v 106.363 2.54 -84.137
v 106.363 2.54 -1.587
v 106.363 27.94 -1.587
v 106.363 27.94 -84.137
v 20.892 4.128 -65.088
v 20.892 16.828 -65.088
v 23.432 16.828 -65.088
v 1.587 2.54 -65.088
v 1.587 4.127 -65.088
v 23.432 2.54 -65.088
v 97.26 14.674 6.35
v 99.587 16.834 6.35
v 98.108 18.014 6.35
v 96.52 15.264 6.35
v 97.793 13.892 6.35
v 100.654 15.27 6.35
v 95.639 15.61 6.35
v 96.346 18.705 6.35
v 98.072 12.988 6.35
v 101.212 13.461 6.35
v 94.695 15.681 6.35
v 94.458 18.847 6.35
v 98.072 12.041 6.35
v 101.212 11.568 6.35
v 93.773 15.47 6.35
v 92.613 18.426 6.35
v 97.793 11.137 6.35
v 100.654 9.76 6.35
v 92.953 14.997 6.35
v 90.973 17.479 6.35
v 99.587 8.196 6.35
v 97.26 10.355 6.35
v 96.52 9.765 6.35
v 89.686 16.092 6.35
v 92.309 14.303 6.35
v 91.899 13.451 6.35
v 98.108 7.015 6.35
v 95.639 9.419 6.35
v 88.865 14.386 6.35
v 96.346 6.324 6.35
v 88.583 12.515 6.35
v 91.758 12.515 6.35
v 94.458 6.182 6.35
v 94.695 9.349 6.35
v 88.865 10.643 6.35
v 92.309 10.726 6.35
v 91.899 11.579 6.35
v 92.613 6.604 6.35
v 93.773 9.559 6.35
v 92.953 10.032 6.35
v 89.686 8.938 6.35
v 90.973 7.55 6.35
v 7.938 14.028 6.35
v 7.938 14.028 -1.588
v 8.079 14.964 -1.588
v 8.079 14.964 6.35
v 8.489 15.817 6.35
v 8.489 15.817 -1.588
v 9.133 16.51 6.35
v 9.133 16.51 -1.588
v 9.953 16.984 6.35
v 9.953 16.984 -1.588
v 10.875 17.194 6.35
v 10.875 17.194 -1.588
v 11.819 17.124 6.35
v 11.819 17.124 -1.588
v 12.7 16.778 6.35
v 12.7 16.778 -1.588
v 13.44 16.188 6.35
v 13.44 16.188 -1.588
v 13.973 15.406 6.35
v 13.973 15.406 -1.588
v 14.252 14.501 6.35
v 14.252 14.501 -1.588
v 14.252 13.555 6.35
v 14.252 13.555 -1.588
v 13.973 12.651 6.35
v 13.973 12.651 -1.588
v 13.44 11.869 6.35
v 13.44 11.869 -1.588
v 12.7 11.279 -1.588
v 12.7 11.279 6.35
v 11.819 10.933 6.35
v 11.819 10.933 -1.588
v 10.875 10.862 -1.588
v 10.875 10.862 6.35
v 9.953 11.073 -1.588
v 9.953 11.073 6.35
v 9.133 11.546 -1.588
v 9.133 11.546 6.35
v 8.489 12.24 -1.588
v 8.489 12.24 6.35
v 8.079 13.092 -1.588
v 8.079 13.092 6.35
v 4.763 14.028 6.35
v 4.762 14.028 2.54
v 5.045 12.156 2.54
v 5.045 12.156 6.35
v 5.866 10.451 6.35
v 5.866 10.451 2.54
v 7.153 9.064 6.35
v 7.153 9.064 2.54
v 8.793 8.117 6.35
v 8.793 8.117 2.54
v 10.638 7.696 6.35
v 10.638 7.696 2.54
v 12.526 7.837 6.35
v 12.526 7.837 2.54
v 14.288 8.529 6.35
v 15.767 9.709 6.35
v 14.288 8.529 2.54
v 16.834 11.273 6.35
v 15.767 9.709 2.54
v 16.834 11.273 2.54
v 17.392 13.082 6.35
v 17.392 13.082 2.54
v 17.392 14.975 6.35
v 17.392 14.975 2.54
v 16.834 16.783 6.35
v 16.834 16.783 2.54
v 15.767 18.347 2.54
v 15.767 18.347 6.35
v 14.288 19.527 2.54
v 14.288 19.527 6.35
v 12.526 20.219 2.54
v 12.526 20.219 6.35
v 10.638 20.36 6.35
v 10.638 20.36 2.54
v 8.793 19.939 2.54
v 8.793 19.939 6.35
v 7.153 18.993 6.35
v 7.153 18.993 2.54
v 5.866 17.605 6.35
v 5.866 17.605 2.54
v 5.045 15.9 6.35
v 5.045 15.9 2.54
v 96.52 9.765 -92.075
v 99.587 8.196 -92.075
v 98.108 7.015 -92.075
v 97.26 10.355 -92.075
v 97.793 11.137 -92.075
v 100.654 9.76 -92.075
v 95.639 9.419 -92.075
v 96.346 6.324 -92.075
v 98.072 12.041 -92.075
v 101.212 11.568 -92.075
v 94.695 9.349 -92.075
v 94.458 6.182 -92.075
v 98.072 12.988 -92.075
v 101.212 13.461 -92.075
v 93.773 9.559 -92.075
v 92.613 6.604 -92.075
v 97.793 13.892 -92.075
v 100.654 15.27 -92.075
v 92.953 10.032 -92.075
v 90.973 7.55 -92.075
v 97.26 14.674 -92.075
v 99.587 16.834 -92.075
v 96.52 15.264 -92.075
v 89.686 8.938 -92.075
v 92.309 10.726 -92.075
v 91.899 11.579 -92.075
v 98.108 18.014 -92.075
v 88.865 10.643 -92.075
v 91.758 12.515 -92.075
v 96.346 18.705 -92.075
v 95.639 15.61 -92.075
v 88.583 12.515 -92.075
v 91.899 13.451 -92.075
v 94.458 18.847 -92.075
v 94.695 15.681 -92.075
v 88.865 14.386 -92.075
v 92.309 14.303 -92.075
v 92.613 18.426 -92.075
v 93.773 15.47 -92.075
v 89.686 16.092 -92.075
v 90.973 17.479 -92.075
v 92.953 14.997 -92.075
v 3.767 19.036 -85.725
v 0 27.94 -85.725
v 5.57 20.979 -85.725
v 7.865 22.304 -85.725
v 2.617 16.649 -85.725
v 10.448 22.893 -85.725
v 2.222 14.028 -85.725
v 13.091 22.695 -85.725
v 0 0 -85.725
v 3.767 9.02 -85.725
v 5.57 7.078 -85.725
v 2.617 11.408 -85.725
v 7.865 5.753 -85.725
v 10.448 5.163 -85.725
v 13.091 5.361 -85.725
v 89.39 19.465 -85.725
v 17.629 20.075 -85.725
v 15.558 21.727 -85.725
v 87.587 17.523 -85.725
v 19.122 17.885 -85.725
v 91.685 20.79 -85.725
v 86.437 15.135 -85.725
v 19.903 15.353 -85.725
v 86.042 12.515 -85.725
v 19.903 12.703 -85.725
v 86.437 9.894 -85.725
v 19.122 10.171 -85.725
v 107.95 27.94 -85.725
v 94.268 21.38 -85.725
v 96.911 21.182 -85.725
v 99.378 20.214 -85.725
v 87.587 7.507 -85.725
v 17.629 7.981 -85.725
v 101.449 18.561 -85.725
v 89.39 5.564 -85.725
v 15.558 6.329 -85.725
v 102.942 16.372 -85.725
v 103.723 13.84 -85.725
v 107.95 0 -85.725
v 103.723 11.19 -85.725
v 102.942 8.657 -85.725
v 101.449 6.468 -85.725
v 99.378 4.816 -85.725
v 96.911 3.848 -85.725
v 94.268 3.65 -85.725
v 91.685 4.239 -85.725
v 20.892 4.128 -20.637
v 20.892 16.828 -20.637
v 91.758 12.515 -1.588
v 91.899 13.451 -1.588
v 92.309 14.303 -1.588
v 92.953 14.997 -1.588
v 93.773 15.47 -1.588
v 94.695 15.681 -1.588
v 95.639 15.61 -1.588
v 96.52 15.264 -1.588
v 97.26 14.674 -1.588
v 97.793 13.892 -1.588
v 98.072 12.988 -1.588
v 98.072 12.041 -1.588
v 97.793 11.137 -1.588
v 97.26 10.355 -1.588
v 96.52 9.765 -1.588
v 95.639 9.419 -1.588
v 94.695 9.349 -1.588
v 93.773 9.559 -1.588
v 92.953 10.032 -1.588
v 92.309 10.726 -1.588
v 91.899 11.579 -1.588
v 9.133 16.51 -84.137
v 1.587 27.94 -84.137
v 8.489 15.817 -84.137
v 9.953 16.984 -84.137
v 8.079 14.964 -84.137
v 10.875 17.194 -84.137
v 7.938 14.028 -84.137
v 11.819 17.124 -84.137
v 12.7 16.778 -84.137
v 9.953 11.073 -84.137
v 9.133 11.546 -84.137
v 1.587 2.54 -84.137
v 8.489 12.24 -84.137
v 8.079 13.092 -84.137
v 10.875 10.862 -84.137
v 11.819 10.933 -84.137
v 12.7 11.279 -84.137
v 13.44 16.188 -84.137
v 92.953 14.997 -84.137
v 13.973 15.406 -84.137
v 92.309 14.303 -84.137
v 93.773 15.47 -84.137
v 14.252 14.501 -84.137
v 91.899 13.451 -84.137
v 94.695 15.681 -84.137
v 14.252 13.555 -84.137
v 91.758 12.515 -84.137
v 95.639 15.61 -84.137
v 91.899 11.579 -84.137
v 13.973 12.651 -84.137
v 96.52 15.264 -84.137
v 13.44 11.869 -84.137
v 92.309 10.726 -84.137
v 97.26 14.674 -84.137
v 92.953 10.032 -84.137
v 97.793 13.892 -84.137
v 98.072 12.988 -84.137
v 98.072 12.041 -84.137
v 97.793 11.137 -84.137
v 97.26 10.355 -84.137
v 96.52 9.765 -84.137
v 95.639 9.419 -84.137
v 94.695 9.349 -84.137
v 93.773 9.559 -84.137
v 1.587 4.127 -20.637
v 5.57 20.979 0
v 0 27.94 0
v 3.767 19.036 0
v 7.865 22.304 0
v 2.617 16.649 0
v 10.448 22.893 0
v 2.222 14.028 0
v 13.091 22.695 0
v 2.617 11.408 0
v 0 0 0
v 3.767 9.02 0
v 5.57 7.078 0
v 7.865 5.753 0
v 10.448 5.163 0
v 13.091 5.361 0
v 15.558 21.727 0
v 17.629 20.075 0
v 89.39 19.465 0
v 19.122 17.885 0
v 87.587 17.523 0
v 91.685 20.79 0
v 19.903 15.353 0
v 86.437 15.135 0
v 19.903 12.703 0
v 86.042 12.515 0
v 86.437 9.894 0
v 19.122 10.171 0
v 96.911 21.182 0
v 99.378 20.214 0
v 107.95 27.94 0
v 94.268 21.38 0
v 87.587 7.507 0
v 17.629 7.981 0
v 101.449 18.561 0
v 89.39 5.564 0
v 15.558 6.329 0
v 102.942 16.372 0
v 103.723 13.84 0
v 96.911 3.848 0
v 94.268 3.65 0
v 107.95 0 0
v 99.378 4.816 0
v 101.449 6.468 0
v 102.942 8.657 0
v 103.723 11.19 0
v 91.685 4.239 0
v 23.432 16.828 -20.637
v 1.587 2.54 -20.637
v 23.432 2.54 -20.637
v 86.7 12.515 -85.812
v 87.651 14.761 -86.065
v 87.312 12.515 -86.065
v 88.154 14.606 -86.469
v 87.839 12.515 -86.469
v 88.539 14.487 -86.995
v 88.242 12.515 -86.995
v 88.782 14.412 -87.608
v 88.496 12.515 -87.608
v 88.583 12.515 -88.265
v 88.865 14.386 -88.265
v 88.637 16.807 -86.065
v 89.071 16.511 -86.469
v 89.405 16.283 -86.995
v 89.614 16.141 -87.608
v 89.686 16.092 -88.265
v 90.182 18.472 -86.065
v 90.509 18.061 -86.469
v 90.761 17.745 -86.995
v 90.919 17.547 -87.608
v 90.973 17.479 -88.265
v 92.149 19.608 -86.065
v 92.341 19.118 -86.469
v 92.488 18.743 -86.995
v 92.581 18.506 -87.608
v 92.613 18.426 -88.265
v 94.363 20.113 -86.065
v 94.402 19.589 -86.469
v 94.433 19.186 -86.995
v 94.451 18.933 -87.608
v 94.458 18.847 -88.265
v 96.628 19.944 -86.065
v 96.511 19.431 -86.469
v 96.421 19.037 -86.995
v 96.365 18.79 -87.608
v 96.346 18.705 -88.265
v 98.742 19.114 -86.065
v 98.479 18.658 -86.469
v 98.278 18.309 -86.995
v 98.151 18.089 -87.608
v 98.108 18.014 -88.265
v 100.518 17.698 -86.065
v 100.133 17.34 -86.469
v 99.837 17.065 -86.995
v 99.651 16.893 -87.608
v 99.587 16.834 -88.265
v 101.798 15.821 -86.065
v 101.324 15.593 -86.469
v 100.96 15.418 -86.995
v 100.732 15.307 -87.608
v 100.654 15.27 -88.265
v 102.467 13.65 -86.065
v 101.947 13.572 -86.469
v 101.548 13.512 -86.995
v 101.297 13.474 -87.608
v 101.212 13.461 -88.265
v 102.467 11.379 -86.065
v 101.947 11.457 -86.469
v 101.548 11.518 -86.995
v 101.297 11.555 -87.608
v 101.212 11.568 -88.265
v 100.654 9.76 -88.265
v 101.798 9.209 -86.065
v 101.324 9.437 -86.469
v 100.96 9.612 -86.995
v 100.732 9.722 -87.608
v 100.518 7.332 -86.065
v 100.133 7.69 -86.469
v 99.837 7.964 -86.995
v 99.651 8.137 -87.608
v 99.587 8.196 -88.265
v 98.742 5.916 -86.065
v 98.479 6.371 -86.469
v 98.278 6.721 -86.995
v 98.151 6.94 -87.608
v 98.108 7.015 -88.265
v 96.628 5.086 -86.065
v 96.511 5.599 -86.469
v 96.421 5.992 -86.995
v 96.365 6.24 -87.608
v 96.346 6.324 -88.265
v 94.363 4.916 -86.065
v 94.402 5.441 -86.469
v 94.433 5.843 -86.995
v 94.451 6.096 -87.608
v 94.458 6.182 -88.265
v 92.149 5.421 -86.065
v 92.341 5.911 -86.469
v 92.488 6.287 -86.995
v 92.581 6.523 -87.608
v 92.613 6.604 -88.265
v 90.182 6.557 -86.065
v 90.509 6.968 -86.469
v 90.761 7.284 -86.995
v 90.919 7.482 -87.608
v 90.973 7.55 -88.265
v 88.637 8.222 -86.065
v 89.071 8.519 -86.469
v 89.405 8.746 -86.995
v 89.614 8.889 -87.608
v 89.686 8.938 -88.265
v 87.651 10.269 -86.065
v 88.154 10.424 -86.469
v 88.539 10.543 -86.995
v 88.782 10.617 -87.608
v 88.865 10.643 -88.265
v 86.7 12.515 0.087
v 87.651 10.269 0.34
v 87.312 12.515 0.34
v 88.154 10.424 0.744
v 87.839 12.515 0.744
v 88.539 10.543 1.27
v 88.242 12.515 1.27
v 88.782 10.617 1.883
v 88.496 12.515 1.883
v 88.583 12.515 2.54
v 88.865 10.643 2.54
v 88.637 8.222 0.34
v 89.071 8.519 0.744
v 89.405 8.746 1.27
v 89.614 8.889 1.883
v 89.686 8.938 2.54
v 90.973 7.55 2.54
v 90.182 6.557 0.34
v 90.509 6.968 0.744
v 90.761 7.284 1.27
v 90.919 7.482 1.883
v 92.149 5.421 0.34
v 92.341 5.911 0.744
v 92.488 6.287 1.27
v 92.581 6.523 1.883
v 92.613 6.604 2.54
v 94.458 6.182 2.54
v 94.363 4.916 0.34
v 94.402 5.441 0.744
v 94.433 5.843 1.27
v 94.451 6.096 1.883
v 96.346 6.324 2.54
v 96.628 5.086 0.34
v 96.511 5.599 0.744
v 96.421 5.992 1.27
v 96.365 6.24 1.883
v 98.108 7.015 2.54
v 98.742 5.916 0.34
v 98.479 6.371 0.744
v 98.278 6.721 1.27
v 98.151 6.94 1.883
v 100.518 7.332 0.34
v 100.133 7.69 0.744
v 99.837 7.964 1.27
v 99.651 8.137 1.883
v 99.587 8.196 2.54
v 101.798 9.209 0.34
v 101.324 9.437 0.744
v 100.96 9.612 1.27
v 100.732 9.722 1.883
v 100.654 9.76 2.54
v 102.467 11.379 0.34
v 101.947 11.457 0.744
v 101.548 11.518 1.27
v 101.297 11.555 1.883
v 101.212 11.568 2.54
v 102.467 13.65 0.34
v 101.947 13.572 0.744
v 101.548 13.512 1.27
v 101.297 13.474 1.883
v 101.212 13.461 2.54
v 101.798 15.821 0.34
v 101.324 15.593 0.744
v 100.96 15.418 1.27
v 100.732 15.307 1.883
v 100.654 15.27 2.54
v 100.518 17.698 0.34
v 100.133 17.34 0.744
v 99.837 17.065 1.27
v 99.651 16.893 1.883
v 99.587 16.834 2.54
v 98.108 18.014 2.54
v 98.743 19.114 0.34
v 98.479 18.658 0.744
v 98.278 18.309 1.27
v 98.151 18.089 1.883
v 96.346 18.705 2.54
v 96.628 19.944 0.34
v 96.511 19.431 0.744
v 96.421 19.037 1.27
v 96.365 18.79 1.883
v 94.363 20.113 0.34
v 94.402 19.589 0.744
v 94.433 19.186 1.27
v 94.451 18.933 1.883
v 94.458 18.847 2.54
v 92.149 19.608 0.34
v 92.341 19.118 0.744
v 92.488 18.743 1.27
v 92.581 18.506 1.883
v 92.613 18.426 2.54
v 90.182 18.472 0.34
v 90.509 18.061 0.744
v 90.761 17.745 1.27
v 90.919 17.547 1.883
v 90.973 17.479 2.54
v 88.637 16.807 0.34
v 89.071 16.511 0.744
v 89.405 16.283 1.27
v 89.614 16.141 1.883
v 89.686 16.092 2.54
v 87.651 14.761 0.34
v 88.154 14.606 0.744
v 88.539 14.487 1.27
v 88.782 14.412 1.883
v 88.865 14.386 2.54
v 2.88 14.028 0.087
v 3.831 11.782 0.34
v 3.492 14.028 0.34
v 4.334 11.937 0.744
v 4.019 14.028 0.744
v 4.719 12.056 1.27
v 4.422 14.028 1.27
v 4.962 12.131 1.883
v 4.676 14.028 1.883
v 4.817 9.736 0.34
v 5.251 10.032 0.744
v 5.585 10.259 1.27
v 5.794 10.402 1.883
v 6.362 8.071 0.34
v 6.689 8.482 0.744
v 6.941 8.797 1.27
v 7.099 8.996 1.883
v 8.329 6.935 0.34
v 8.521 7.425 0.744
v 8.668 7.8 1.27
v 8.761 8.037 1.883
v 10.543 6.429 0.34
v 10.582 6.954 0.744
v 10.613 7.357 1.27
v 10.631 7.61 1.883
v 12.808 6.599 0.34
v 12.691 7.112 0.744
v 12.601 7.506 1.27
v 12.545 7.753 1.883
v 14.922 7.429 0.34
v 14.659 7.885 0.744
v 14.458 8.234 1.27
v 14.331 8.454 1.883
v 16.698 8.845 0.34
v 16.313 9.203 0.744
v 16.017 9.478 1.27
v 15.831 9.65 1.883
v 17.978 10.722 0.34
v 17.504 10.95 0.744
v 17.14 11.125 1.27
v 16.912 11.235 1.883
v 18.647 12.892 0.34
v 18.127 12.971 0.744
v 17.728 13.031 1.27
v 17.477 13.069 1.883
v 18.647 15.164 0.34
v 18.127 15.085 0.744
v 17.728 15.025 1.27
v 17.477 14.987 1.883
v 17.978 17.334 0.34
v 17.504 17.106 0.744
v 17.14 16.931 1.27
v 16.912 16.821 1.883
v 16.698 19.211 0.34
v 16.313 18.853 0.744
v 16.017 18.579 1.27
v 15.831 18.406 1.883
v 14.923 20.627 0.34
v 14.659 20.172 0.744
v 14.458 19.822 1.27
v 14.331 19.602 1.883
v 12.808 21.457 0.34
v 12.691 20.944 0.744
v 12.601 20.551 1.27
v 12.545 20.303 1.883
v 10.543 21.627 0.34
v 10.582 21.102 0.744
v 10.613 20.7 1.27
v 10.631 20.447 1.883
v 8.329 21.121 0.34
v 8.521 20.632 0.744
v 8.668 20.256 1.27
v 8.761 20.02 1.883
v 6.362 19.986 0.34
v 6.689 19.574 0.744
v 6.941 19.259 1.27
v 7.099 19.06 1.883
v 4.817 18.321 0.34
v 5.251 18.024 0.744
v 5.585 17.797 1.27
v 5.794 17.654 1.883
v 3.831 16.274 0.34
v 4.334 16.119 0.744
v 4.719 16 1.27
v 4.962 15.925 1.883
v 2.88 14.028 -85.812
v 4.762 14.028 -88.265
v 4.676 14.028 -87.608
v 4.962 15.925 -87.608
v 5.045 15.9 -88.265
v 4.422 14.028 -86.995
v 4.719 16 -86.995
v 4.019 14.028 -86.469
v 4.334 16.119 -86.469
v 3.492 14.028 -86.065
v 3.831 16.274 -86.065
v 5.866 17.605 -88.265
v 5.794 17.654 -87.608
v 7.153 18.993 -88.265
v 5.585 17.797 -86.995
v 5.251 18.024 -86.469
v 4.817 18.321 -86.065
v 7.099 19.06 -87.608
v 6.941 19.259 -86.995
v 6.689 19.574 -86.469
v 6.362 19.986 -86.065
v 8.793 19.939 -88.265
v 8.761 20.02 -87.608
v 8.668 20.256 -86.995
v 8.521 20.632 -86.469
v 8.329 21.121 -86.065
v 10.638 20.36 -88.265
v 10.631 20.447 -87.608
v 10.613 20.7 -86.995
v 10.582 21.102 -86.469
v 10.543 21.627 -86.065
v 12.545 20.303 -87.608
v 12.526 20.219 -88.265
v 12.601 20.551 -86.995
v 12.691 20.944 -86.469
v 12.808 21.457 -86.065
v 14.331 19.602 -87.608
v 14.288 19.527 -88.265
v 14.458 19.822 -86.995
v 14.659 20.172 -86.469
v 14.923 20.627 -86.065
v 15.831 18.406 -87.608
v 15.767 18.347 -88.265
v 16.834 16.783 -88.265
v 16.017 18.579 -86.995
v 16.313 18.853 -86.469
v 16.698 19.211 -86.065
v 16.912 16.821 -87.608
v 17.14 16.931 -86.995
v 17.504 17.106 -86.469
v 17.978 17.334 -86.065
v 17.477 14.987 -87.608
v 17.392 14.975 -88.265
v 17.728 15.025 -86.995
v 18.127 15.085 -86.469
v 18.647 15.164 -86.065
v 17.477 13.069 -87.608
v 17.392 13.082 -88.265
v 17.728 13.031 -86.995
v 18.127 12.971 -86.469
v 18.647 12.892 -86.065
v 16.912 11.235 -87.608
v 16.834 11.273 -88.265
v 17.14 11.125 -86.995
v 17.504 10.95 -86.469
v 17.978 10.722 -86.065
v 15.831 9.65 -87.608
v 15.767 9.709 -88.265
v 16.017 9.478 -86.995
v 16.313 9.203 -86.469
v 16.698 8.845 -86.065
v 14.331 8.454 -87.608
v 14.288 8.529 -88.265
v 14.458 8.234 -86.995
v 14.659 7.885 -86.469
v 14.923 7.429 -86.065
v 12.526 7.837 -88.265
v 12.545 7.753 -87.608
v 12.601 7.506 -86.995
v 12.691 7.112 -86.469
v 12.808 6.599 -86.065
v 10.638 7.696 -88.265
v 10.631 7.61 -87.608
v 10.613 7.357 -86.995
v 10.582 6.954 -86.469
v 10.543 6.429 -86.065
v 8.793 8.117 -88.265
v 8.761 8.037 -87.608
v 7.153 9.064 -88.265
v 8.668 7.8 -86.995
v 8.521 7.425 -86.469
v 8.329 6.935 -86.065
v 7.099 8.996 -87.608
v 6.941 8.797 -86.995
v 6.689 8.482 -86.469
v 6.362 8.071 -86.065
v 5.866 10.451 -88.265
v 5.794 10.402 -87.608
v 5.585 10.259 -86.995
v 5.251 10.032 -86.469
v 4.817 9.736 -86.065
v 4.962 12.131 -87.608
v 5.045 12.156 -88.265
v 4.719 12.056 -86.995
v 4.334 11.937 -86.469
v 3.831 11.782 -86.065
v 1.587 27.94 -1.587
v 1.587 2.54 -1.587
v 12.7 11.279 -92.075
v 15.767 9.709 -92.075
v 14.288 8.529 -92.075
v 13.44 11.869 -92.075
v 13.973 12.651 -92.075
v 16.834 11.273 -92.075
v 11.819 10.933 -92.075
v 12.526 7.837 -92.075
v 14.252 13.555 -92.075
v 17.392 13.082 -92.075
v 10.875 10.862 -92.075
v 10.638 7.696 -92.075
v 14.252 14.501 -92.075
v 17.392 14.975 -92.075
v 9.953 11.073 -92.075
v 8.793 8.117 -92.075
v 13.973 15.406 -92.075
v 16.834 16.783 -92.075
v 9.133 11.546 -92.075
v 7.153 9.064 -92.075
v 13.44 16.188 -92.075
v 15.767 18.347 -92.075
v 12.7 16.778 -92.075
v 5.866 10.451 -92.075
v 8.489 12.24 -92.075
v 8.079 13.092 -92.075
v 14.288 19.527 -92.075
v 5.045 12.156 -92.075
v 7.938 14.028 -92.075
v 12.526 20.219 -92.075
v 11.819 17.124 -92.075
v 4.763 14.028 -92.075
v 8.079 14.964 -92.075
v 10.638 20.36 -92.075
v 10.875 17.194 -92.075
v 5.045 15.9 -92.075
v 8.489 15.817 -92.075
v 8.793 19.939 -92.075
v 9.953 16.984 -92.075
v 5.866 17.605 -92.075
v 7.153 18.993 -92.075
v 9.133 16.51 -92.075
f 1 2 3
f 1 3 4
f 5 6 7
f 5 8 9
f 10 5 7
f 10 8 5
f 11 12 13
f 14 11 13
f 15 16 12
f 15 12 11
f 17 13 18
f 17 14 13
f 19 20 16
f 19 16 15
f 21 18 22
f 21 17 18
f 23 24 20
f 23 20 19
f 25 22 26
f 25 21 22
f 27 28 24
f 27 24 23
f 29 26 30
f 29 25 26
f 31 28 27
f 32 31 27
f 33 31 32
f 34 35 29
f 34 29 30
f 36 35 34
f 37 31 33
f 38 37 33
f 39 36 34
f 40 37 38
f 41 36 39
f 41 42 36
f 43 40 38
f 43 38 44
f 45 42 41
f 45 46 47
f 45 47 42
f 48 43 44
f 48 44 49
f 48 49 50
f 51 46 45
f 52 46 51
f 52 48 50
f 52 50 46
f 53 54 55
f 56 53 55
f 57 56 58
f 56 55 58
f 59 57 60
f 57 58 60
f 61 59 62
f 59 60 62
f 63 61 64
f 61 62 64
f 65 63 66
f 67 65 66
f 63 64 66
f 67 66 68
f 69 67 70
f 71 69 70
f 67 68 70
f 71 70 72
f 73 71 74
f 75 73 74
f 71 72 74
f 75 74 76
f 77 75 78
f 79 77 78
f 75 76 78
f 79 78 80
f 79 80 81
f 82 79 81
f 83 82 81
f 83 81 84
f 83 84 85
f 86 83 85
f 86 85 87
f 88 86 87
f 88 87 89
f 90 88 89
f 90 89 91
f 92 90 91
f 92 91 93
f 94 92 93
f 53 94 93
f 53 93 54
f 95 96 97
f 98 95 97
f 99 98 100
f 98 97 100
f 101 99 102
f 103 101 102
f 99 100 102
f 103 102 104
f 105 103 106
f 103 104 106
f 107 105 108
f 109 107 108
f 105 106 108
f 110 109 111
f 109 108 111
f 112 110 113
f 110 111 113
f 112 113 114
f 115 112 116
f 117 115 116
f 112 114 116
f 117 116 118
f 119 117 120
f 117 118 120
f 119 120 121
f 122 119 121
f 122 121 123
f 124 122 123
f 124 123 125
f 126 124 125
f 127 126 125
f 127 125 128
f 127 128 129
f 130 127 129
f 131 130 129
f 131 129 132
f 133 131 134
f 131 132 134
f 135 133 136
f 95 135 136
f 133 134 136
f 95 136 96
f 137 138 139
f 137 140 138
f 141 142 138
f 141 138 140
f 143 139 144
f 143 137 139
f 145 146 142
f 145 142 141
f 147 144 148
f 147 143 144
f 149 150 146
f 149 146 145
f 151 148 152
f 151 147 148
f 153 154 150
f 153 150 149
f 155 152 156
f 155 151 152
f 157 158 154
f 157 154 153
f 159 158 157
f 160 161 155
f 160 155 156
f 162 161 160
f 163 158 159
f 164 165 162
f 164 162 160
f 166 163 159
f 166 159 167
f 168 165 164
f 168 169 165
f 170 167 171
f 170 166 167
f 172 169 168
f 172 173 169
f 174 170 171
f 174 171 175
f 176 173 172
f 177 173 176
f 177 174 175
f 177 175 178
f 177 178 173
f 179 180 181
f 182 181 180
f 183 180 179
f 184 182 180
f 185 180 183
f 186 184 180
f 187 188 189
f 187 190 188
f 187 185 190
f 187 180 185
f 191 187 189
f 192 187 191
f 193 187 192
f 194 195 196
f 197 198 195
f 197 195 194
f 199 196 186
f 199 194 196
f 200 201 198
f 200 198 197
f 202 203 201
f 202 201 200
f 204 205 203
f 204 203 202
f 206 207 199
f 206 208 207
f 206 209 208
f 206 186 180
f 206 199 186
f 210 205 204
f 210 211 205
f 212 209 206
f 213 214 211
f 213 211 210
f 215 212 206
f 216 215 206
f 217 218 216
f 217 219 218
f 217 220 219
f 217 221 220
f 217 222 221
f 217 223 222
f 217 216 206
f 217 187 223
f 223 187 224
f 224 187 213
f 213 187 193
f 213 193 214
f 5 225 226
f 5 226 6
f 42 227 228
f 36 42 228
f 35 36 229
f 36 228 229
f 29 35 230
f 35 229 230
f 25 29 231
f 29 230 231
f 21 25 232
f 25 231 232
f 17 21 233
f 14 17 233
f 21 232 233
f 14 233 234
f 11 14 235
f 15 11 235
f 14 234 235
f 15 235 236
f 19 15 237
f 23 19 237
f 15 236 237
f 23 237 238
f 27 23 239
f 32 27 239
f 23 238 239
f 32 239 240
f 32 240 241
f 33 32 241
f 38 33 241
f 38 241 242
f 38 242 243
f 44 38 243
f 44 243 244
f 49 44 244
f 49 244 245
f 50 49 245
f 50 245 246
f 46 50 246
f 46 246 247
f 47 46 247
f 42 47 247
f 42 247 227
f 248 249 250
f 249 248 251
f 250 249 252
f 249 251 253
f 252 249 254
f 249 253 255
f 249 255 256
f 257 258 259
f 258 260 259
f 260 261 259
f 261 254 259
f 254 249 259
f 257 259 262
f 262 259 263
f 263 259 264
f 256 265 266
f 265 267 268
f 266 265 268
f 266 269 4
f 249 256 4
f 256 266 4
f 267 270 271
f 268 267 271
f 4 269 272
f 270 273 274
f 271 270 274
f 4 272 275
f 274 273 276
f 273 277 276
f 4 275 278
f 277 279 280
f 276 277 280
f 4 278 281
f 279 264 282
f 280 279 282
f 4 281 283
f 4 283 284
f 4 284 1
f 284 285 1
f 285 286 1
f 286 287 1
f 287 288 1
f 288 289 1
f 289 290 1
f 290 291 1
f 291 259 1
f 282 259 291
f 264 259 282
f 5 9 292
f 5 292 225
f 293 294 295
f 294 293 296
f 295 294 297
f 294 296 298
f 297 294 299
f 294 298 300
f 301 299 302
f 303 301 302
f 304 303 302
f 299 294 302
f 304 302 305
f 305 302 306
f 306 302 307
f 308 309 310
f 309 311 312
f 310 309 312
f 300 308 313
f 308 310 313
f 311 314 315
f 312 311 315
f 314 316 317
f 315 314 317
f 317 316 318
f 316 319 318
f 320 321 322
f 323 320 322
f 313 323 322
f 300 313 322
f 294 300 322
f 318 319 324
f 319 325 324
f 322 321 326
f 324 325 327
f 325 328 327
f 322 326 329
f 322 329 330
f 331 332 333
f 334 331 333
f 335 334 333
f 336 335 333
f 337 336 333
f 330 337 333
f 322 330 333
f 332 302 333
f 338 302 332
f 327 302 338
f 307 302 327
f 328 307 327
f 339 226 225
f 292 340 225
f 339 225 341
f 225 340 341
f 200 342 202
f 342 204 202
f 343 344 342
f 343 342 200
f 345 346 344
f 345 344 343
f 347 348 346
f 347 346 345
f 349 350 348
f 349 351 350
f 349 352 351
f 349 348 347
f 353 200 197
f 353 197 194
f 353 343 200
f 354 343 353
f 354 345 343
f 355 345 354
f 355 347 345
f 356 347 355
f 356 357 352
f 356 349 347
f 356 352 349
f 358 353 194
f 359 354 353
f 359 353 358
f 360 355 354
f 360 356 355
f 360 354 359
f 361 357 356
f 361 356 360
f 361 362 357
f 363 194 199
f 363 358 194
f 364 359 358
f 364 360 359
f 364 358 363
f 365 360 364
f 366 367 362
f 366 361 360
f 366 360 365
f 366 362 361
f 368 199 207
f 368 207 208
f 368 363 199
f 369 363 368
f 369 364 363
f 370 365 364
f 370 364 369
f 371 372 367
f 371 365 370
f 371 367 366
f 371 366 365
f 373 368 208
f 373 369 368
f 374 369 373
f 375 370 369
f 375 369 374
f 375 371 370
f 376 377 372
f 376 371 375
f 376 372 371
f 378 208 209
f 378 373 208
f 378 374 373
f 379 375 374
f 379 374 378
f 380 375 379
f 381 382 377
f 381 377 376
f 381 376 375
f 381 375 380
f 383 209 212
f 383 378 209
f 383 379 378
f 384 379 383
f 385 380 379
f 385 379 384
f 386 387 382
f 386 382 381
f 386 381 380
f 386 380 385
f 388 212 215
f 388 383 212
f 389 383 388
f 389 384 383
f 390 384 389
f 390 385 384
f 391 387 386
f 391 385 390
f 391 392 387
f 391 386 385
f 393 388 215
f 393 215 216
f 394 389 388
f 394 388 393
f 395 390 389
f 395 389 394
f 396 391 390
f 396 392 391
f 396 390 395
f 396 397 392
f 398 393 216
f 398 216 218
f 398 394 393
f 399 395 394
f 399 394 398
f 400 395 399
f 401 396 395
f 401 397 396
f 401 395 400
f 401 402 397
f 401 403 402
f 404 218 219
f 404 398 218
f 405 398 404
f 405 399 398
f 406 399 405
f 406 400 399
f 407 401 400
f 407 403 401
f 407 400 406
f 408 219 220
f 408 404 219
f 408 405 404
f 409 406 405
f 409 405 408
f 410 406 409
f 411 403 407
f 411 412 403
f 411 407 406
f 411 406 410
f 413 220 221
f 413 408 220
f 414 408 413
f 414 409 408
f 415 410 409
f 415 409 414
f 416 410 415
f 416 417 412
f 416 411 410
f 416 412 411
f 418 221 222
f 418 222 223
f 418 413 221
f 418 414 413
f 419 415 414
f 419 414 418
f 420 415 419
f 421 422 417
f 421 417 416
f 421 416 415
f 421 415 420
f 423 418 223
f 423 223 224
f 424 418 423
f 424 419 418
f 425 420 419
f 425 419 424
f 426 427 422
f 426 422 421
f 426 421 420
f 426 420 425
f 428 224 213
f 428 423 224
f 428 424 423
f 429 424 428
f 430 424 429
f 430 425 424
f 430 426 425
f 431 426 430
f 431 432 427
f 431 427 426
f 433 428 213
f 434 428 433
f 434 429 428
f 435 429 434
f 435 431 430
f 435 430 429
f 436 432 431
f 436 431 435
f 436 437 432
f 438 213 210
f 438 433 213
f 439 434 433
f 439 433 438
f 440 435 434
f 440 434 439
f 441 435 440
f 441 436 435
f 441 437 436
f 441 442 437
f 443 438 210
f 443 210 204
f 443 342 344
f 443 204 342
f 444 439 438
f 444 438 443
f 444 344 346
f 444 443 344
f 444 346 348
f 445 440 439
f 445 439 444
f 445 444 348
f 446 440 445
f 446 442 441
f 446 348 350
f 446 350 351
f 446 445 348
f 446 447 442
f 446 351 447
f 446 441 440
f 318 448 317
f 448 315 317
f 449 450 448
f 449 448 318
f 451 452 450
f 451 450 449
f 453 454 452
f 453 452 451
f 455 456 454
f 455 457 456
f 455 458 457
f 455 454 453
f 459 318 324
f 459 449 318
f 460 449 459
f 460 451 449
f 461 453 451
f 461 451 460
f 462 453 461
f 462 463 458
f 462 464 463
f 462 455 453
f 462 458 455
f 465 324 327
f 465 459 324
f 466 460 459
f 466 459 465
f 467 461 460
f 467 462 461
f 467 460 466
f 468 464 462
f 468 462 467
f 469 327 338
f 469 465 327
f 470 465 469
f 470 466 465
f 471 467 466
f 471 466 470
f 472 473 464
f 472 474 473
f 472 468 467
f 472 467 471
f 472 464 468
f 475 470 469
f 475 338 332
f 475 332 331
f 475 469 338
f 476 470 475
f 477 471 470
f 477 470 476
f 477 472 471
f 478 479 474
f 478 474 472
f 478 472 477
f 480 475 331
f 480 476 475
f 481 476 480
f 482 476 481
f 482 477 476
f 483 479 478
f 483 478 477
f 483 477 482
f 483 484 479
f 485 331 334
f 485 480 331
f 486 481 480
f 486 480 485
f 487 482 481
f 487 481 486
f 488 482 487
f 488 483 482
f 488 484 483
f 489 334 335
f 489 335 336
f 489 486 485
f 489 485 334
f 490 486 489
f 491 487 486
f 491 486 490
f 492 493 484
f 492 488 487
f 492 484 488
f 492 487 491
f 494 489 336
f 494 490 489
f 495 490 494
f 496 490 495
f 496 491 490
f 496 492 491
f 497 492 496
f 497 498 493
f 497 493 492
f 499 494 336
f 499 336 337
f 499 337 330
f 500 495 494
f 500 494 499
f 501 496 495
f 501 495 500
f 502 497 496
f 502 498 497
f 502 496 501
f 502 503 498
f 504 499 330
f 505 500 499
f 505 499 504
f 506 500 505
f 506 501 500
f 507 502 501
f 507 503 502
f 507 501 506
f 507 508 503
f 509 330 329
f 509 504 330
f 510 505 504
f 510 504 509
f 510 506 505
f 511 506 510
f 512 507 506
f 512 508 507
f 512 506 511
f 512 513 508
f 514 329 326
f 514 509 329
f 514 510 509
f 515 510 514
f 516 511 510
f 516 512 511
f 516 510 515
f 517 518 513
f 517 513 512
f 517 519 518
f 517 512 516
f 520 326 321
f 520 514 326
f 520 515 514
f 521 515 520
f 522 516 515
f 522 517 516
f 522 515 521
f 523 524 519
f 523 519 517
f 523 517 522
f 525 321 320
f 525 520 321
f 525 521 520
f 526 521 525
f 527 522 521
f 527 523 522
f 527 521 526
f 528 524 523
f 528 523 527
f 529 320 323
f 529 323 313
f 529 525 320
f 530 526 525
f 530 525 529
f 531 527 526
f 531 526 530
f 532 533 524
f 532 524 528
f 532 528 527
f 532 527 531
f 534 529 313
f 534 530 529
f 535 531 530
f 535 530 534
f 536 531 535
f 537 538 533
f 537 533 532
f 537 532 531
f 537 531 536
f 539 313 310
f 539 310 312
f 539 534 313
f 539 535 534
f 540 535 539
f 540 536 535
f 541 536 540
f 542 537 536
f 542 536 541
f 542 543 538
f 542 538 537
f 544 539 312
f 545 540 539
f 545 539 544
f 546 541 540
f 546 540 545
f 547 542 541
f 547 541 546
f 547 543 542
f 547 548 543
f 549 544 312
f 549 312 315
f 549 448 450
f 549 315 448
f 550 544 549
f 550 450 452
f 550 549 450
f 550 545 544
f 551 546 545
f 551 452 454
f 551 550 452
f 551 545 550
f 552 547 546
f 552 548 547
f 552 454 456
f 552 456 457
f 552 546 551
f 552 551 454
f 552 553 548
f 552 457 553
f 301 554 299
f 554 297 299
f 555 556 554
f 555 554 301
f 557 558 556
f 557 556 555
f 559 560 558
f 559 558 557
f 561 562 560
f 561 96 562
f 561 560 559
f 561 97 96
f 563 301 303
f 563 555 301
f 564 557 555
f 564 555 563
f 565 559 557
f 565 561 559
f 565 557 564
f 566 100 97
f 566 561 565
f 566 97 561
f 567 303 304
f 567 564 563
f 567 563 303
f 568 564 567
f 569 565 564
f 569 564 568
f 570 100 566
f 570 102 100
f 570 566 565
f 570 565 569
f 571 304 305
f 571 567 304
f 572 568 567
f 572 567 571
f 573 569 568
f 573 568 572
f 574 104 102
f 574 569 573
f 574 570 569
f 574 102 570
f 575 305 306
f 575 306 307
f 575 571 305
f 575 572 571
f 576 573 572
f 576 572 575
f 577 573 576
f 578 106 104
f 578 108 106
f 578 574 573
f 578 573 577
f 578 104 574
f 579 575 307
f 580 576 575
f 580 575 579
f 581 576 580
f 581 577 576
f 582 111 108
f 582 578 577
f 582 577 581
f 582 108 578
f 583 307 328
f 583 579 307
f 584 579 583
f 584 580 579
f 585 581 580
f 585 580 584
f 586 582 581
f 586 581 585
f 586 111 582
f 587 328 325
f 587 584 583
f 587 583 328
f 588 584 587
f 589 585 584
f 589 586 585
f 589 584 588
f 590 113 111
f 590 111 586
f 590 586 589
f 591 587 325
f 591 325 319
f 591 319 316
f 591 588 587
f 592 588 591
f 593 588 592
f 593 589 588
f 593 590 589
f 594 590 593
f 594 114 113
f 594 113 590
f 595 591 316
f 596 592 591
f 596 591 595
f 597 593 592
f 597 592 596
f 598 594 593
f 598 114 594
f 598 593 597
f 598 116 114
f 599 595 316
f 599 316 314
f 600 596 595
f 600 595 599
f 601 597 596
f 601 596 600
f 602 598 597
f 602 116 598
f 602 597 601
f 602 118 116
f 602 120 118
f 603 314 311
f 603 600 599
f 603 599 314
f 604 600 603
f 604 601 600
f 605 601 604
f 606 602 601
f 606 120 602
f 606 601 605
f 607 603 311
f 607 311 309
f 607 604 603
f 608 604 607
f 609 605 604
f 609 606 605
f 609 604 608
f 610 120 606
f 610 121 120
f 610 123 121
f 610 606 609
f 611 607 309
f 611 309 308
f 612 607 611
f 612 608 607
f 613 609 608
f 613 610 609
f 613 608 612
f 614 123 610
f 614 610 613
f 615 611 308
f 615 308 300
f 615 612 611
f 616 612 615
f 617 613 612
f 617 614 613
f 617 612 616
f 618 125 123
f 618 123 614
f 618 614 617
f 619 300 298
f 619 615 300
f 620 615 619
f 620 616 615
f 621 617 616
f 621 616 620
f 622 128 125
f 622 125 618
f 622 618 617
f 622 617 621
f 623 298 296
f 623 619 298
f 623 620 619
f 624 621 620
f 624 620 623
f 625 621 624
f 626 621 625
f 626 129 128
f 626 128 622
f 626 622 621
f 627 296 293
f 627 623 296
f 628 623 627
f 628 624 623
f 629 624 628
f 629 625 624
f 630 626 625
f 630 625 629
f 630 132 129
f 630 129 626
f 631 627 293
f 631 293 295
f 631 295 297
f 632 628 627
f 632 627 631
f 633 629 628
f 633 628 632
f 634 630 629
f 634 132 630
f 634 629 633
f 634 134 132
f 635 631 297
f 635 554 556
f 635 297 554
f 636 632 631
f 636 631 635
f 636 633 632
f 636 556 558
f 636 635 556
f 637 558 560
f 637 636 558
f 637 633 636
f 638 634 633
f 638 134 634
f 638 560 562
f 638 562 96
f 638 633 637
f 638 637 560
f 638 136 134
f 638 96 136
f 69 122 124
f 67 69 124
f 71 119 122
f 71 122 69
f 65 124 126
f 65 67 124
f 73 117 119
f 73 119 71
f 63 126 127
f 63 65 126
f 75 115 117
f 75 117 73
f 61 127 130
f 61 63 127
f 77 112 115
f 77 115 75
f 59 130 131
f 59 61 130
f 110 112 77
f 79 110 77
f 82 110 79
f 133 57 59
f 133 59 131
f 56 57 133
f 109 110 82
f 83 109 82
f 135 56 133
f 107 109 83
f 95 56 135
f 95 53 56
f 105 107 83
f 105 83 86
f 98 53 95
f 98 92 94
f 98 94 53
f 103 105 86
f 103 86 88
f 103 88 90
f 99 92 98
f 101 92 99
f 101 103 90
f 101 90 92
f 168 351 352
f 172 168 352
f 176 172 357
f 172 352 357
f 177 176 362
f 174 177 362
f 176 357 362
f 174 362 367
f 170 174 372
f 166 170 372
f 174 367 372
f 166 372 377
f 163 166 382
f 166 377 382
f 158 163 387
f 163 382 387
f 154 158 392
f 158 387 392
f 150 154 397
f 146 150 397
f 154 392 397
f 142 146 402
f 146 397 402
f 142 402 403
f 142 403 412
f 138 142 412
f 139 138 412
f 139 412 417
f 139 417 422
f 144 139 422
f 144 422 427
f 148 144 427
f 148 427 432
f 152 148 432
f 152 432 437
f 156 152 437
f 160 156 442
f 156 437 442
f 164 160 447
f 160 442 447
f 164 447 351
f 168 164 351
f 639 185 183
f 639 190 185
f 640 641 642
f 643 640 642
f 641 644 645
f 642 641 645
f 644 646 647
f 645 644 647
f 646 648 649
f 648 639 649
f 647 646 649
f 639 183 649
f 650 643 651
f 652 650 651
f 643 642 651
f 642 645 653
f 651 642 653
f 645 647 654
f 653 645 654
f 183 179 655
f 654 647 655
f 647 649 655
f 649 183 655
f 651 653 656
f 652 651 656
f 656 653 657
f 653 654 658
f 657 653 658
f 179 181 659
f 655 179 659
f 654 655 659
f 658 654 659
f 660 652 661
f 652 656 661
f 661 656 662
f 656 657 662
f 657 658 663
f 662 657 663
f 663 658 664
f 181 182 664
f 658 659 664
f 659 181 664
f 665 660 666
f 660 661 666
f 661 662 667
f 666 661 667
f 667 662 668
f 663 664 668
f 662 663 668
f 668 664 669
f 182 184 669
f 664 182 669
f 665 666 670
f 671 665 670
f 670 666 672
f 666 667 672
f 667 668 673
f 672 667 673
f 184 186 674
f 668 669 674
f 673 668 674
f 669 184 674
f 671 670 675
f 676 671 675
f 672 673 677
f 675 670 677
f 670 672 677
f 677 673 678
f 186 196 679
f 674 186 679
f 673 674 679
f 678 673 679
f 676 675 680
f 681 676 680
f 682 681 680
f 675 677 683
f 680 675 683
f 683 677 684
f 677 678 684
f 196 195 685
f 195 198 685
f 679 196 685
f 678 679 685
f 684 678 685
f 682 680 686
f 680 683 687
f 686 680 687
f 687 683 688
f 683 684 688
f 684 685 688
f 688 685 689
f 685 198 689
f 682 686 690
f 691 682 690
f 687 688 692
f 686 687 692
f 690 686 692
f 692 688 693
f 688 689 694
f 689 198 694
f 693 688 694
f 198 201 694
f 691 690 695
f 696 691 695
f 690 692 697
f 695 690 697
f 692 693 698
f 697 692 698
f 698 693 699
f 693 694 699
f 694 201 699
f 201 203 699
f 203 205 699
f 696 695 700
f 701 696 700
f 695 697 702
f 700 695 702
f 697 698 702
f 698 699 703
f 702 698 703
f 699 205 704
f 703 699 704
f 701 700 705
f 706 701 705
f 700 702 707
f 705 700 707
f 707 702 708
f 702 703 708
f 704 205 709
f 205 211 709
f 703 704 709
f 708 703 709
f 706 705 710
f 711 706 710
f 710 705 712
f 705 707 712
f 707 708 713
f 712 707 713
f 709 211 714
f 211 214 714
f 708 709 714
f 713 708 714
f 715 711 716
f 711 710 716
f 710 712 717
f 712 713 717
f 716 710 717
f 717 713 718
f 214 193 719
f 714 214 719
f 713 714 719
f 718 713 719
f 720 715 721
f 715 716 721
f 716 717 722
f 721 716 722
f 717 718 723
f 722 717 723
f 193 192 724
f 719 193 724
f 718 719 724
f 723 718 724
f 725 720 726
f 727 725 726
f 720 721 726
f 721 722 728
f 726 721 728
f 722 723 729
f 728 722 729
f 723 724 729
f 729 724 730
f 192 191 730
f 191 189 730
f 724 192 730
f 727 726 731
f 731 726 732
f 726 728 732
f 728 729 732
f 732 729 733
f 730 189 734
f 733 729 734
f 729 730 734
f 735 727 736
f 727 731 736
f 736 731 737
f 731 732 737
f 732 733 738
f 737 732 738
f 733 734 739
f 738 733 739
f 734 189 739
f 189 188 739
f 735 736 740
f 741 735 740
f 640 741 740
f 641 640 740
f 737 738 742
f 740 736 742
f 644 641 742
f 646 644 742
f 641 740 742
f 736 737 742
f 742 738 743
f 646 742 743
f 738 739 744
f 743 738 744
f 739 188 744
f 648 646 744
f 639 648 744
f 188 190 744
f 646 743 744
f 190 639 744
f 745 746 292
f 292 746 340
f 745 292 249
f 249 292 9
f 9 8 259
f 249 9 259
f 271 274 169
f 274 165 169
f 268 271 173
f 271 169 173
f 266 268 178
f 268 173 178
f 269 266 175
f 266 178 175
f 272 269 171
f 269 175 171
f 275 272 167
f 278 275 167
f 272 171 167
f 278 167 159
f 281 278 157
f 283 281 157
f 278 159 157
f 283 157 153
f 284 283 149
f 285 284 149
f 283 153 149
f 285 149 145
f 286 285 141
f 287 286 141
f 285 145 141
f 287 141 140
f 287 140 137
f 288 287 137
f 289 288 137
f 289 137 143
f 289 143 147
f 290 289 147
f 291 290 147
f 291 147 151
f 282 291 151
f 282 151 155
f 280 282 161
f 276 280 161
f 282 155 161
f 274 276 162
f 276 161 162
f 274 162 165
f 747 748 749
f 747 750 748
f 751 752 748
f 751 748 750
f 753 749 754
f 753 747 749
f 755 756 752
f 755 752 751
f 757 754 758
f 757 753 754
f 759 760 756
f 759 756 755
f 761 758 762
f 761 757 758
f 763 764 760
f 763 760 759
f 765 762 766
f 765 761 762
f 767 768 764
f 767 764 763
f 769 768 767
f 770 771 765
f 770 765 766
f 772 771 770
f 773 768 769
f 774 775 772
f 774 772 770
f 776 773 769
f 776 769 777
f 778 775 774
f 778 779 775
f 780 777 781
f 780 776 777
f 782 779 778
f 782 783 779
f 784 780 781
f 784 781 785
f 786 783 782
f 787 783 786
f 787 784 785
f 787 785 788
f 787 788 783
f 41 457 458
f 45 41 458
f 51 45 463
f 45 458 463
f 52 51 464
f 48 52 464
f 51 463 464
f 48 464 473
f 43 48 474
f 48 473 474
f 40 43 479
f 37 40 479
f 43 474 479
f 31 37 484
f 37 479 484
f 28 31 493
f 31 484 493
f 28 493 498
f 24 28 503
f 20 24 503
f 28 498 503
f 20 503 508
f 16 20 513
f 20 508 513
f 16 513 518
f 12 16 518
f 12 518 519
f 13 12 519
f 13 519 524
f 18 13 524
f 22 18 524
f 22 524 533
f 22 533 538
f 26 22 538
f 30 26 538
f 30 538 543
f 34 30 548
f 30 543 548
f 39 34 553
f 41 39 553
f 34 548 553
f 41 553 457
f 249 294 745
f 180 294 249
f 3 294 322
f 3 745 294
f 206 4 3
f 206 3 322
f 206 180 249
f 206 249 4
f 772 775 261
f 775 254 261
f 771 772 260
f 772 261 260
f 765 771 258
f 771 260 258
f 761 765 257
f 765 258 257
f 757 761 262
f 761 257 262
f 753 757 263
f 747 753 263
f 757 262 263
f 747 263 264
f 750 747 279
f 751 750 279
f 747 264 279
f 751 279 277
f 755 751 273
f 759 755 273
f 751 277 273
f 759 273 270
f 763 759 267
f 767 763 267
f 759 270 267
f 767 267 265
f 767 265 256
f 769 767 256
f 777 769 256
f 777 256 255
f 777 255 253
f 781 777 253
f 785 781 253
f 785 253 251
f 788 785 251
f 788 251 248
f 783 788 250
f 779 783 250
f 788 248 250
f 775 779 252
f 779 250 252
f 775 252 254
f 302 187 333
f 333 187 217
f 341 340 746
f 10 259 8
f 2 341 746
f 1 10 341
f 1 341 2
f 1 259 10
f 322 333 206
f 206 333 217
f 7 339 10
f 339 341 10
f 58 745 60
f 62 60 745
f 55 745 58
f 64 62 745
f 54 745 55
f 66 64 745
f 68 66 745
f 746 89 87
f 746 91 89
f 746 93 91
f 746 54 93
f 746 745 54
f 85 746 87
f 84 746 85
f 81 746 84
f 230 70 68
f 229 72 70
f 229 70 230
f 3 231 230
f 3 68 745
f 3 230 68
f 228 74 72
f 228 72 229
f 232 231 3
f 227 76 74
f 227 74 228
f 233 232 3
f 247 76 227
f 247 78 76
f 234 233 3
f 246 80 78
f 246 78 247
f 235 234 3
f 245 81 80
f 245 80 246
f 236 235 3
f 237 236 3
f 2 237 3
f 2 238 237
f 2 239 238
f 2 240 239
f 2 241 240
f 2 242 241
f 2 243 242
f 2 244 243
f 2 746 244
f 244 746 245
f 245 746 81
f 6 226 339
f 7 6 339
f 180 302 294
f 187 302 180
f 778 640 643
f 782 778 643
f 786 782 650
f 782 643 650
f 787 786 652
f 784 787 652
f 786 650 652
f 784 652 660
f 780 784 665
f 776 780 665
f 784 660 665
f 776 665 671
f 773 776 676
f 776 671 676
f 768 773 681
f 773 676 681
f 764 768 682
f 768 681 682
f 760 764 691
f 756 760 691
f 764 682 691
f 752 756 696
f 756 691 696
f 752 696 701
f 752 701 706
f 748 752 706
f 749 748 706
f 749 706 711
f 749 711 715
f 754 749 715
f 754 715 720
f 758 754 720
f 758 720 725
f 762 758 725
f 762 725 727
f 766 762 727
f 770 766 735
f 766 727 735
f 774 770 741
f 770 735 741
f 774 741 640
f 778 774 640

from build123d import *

# Parameters (mm, degrees)
SKETCH1_W               = 107.95
SKETCH1_H               = 85.725
BOSS_EXTRUDE1_DEPTH     = 2.54
SKETCH2_W               = 107.95
SKETCH2_H               = 85.725
SKETCH2_W_2             = 104.775
SKETCH2_H_2             = 82.55
BOSS_EXTRUDE2_DEPTH     = 25.4
SKETCH3_R               = 3.175
CUT_EXTRUDE1_DEPTH      = 141.650708228
CUT_EXTRUDE1_DEPTH_BACK = 141.650708228
SKETCH4_R               = 3.175
CUT_EXTRUDE2_DEPTH      = 141.650708228
CUT_EXTRUDE2_DEPTH_BACK = 141.650708228
SKETCH5_W               = 21.844
SKETCH5_H               = 44.45
BOSS_EXTRUDE3_DEPTH     = 1.5875
SKETCH6_W               = 2.54
SKETCH6_H               = 44.45
BOSS_EXTRUDE4_DEPTH     = 12.7
SKETCH7_R               = 6.35
BOSS_EXTRUDE5_DEPTH     = 6.35
SKETCH8_R               = 6.35
BOSS_EXTRUDE6_DEPTH     = 6.35
FILLET1_R               = 2.54
FILLET2_R               = 2.54
SKETCH9_R               = 6.35
BOSS_EXTRUDE7_DEPTH     = 6.35
SKETCH10_R              = 6.35
BOSS_EXTRUDE8_DEPTH     = 6.35
FILLET3_R               = 2.54
SKETCH11_R              = 3.175
CUT_EXTRUDE4_DEPTH      = 145.608615667
CUT_EXTRUDE4_DEPTH_BACK = 145.608615667
SKETCH12_R              = 3.175
CUT_EXTRUDE5_DEPTH      = 145.608615667
CUT_EXTRUDE5_DEPTH_BACK = 145.608615667


with BuildPart() as part:
    # Sketch1 → Boss-Extrude1 (new body)
    with BuildSketch(Plane(origin=(0, 0, 0), x_dir=(1, 0, 0), z_dir=(0, 1, 0))):
        with Locations((53.975, 42.8625)):
            Rectangle(SKETCH1_W, SKETCH1_H)
    extrude(amount=BOSS_EXTRUDE1_DEPTH)

    # Sketch2 → Boss-Extrude2 (add)
    with BuildSketch(Plane(origin=(0, 2.54, 0), x_dir=(1, 0, 0), z_dir=(0, 1, 0))):
        with Locations((53.975, 42.8625)):
            Rectangle(SKETCH2_W, SKETCH2_H)
        with Locations((53.975, 42.8625)):
            Rectangle(SKETCH2_W_2, SKETCH2_H_2, mode=Mode.SUBTRACT)
    extrude(amount=BOSS_EXTRUDE2_DEPTH)

    # Sketch3 → Cut-Extrude1 (cut, two sides)
    with BuildSketch(Plane(origin=(0, 0, -85.725), x_dir=(-1, 0, 0), z_dir=(0, 0, -1))) as cut_extrude1_sk:
        with Locations((-11.1125, 14.028153998)):
            Circle(SKETCH3_R)
    extrude(amount=CUT_EXTRUDE1_DEPTH, mode=Mode.SUBTRACT)
    extrude(cut_extrude1_sk.sketch, amount=-CUT_EXTRUDE1_DEPTH_BACK, mode=Mode.SUBTRACT)

    # Sketch4 → Cut-Extrude2 (cut, two sides)
    with BuildSketch(Plane(origin=(0, 0, -85.725), x_dir=(-1, 0, 0), z_dir=(0, 0, -1))) as cut_extrude2_sk:
        with Locations((-94.9325, 12.514694303)):
            Circle(SKETCH4_R)
    extrude(amount=CUT_EXTRUDE2_DEPTH, mode=Mode.SUBTRACT)
    extrude(cut_extrude2_sk.sketch, amount=-CUT_EXTRUDE2_DEPTH_BACK, mode=Mode.SUBTRACT)

    # Sketch5 → Boss-Extrude3 (add)
    with BuildSketch(Plane(origin=(0, 2.54, 0), x_dir=(1, 0, 0), z_dir=(0, 1, 0))):
        with Locations((12.5095, 42.8625)):
            Rectangle(SKETCH5_W, SKETCH5_H)
    extrude(amount=BOSS_EXTRUDE3_DEPTH)

    # Sketch6 → Boss-Extrude4 (add)
    with BuildSketch(Plane(origin=(0, 4.1275, 0), x_dir=(1, 0, 0), z_dir=(0, 1, 0))):
        with Locations((22.1615, 42.8625)):
            Rectangle(SKETCH6_W, SKETCH6_H)
    extrude(amount=BOSS_EXTRUDE4_DEPTH)

    # Sketch7 → Boss-Extrude5 (add)
    with BuildSketch(Plane.XY):
        with Locations(Location((11.1125, 14.028153998, 0), (0, 0, 180))):
            Circle(SKETCH7_R)
    extrude(amount=BOSS_EXTRUDE5_DEPTH)

    # Sketch8 → Boss-Extrude6 (add)
    with BuildSketch(Plane.XY):
        with Locations(Location((94.9325, 12.514694303, 0), (0, 0, 180))):
            Circle(SKETCH8_R)
    extrude(amount=BOSS_EXTRUDE6_DEPTH)

    # Fillet1
    fillet1_edges = [part.edges().sort_by_distance(p)[0] for p in [
        (17.4625, 14.028153998, 0),
    ]]
    fillet(fillet1_edges, radius=FILLET1_R)

    # Fillet2
    fillet2_edges = [part.edges().sort_by_distance(p)[0] for p in [
        (101.2825, 12.514694303, 0),
    ]]
    fillet(fillet2_edges, radius=FILLET2_R)

    # Sketch9 → Boss-Extrude7 (add)
    with BuildSketch(Plane(origin=(0, 0, -85.725), x_dir=(-1, 0, 0), z_dir=(0, 0, -1))):
        with Locations((-94.9325, 12.514694303)):
            Circle(SKETCH9_R)
    extrude(amount=BOSS_EXTRUDE7_DEPTH)

    # Sketch10 → Boss-Extrude8 (add)
    with BuildSketch(Plane(origin=(0, 0, -85.725), x_dir=(-1, 0, 0), z_dir=(0, 0, -1))):
        with Locations((-11.1125, 14.028153998)):
            Circle(SKETCH10_R)
    extrude(amount=BOSS_EXTRUDE8_DEPTH)

    # Fillet3
    fillet3_edges = [part.edges().sort_by_distance(p)[0] for p in [
        (101.2825, 12.514694303, -85.725),
        (17.4625, 14.028153998, -85.725),
    ]]
    fillet(fillet3_edges, radius=FILLET3_R)

    # Sketch11 → Cut-Extrude4 (cut, two sides)
    with BuildSketch(Plane.XY.offset(-85.725)) as cut_extrude4_sk:
        with Locations(Location((94.9325, 12.514694303, 0), (0, 0, 180))):
            Circle(SKETCH11_R)
    extrude(amount=CUT_EXTRUDE4_DEPTH, mode=Mode.SUBTRACT)
    extrude(cut_extrude4_sk.sketch, amount=-CUT_EXTRUDE4_DEPTH_BACK, mode=Mode.SUBTRACT)

    # Sketch12 → Cut-Extrude5 (cut, two sides)
    with BuildSketch(Plane.XY.offset(-85.725)) as cut_extrude5_sk:
        with Locations(Location((11.1125, 14.028153998, 0), (0, 0, 180))):
            Circle(SKETCH12_R)
    extrude(amount=CUT_EXTRUDE5_DEPTH, mode=Mode.SUBTRACT)
    extrude(cut_extrude5_sk.sketch, amount=-CUT_EXTRUDE5_DEPTH_BACK, mode=Mode.SUBTRACT)


solid = part.part
